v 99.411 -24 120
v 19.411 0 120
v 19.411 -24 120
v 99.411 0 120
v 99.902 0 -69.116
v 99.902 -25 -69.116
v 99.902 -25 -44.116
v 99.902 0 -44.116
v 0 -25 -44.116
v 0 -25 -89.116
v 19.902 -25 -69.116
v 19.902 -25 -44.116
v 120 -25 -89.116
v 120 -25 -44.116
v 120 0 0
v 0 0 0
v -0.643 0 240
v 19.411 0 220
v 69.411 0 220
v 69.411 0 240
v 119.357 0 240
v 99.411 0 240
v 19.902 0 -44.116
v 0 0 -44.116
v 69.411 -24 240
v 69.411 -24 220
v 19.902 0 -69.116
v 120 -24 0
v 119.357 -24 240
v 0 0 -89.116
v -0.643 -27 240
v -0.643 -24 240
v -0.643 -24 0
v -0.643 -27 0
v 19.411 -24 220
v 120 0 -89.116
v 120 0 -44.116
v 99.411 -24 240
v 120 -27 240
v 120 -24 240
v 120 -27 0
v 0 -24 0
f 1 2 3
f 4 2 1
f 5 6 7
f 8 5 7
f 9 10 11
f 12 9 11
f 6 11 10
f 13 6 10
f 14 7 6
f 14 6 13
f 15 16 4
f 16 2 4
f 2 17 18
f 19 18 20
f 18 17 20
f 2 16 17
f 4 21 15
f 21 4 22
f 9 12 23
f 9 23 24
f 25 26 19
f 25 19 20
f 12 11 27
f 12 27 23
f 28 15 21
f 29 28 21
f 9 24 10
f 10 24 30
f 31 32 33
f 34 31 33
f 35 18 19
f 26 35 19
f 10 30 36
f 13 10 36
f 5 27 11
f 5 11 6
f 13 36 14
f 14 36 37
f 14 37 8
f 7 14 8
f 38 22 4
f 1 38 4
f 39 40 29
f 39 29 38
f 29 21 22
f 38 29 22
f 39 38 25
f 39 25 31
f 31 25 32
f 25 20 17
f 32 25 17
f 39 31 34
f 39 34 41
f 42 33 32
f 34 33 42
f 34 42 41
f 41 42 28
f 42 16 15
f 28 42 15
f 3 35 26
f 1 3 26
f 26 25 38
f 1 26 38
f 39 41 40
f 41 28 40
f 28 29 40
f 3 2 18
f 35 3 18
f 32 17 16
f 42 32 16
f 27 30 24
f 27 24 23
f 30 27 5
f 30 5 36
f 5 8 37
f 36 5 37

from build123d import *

# Parameters (mm, degrees)
F0_W          = 80
F0_H          = 25
F1_DEPTH      = 25
F0_H_2        = 80
F2_DEPTH      = 25
F3_W          = 79.7933001444
F3_H          = 20
F4_DEPTH      = 25
F6_DEPTH      = 1
F6_DEPTH_BACK = 2
F7_DEPTH      = 25
F8_DEPTH      = 25
F9_DEPTH      = 25


with BuildPart() as f1:
    # F0 (on Front) → F1 (new body)
    with BuildSketch(Plane.XZ):
        with Locations((59.9016835541, -56.6160219908)):
            Rectangle(F0_W, F0_H)
        Polygon((120, -89.1160219908), (120, -44.1160219908), (99.9016835541, -44.1160219908), (99.9016835541, -69.1160219908), (19.9016835541, -69.1160219908), (19.9016835541, -44.1160219908), (0, -44.1160219908), (0, -89.1160219908), align=None)
    extrude(amount=F1_DEPTH)

    # F0 (on Front) → F8 (cut)
    with BuildSketch(Plane.XZ):
        with Locations((59.9016835541, -56.6160219908)):
            Rectangle(F0_W, F0_H)
    extrude(amount=-F8_DEPTH, mode=Mode.SUBTRACT)

    # F0 (on Front) → F9 (cut)
    with BuildSketch(Plane.XZ):
        with Locations((59.9016835541, -56.6160219908)):
            Rectangle(F0_W, F0_H)
    extrude(amount=F9_DEPTH, mode=Mode.SUBTRACT)


with BuildPart() as f1b:
    # F0 (on Front) → F1, piece 2 (new body)
    with BuildSketch(Plane.XZ):
        Polygon((-0.643079976, 240), (0, 0), (120, 0), (119.356920024, 240), (69.4105818191, 240), (69.4105818191, 220), (99.4105818191, 220), (99.4105818191, 130), (99.4105818191, 120), (99.4105818191, 40), (19.4105818191, 40), (19.4105818191, 120), (19.4105818191, 200), (19.4105818191, 220), (19.356991821, 240), align=None)
        Polygon((69.4105818191, 240), (19.356991821, 240), (19.4105818191, 220), (69.4105818191, 220), align=None)
    extrude(amount=F1_DEPTH)

    # F0 (on Front) → F2 (join)
    with BuildSketch(Plane.XZ):
        with Locations((59.4105818191, 80)):
            Rectangle(F0_W, F0_H_2)
    extrude(amount=F2_DEPTH)

    # F3 (on face) → F4 (cut)
    with BuildSketch(Plane.XZ.offset(25)):
        with Locations((59.5139317469, 230)):
            Rectangle(F3_W, F3_H)
    extrude(amount=-F4_DEPTH, mode=Mode.SUBTRACT)

    # F5 (on face) → F6 (join, two sides)
    with BuildSketch(Plane.XZ.offset(25)) as f6_sk:
        Polygon((0, 0), (-0.643079976, 240), (-0.643079976, 0), align=None)
        Polygon((119.356920024, 240), (-0.643079976, 240), (-0.643079976, 0), (0, 0), (120, 0), (120, 240), align=None)
    extrude(amount=-F6_DEPTH)
    extrude(f6_sk.sketch, amount=F6_DEPTH_BACK)

    # F0 (on Front) → F7 (join)
    with BuildSketch(Plane.XZ):
        Polygon((69.4105818191, 240), (19.356991821, 240), (19.4105818191, 220), (69.4105818191, 220), align=None)
    extrude(amount=F7_DEPTH)


solid = Compound([f1.part, f1b.part])
